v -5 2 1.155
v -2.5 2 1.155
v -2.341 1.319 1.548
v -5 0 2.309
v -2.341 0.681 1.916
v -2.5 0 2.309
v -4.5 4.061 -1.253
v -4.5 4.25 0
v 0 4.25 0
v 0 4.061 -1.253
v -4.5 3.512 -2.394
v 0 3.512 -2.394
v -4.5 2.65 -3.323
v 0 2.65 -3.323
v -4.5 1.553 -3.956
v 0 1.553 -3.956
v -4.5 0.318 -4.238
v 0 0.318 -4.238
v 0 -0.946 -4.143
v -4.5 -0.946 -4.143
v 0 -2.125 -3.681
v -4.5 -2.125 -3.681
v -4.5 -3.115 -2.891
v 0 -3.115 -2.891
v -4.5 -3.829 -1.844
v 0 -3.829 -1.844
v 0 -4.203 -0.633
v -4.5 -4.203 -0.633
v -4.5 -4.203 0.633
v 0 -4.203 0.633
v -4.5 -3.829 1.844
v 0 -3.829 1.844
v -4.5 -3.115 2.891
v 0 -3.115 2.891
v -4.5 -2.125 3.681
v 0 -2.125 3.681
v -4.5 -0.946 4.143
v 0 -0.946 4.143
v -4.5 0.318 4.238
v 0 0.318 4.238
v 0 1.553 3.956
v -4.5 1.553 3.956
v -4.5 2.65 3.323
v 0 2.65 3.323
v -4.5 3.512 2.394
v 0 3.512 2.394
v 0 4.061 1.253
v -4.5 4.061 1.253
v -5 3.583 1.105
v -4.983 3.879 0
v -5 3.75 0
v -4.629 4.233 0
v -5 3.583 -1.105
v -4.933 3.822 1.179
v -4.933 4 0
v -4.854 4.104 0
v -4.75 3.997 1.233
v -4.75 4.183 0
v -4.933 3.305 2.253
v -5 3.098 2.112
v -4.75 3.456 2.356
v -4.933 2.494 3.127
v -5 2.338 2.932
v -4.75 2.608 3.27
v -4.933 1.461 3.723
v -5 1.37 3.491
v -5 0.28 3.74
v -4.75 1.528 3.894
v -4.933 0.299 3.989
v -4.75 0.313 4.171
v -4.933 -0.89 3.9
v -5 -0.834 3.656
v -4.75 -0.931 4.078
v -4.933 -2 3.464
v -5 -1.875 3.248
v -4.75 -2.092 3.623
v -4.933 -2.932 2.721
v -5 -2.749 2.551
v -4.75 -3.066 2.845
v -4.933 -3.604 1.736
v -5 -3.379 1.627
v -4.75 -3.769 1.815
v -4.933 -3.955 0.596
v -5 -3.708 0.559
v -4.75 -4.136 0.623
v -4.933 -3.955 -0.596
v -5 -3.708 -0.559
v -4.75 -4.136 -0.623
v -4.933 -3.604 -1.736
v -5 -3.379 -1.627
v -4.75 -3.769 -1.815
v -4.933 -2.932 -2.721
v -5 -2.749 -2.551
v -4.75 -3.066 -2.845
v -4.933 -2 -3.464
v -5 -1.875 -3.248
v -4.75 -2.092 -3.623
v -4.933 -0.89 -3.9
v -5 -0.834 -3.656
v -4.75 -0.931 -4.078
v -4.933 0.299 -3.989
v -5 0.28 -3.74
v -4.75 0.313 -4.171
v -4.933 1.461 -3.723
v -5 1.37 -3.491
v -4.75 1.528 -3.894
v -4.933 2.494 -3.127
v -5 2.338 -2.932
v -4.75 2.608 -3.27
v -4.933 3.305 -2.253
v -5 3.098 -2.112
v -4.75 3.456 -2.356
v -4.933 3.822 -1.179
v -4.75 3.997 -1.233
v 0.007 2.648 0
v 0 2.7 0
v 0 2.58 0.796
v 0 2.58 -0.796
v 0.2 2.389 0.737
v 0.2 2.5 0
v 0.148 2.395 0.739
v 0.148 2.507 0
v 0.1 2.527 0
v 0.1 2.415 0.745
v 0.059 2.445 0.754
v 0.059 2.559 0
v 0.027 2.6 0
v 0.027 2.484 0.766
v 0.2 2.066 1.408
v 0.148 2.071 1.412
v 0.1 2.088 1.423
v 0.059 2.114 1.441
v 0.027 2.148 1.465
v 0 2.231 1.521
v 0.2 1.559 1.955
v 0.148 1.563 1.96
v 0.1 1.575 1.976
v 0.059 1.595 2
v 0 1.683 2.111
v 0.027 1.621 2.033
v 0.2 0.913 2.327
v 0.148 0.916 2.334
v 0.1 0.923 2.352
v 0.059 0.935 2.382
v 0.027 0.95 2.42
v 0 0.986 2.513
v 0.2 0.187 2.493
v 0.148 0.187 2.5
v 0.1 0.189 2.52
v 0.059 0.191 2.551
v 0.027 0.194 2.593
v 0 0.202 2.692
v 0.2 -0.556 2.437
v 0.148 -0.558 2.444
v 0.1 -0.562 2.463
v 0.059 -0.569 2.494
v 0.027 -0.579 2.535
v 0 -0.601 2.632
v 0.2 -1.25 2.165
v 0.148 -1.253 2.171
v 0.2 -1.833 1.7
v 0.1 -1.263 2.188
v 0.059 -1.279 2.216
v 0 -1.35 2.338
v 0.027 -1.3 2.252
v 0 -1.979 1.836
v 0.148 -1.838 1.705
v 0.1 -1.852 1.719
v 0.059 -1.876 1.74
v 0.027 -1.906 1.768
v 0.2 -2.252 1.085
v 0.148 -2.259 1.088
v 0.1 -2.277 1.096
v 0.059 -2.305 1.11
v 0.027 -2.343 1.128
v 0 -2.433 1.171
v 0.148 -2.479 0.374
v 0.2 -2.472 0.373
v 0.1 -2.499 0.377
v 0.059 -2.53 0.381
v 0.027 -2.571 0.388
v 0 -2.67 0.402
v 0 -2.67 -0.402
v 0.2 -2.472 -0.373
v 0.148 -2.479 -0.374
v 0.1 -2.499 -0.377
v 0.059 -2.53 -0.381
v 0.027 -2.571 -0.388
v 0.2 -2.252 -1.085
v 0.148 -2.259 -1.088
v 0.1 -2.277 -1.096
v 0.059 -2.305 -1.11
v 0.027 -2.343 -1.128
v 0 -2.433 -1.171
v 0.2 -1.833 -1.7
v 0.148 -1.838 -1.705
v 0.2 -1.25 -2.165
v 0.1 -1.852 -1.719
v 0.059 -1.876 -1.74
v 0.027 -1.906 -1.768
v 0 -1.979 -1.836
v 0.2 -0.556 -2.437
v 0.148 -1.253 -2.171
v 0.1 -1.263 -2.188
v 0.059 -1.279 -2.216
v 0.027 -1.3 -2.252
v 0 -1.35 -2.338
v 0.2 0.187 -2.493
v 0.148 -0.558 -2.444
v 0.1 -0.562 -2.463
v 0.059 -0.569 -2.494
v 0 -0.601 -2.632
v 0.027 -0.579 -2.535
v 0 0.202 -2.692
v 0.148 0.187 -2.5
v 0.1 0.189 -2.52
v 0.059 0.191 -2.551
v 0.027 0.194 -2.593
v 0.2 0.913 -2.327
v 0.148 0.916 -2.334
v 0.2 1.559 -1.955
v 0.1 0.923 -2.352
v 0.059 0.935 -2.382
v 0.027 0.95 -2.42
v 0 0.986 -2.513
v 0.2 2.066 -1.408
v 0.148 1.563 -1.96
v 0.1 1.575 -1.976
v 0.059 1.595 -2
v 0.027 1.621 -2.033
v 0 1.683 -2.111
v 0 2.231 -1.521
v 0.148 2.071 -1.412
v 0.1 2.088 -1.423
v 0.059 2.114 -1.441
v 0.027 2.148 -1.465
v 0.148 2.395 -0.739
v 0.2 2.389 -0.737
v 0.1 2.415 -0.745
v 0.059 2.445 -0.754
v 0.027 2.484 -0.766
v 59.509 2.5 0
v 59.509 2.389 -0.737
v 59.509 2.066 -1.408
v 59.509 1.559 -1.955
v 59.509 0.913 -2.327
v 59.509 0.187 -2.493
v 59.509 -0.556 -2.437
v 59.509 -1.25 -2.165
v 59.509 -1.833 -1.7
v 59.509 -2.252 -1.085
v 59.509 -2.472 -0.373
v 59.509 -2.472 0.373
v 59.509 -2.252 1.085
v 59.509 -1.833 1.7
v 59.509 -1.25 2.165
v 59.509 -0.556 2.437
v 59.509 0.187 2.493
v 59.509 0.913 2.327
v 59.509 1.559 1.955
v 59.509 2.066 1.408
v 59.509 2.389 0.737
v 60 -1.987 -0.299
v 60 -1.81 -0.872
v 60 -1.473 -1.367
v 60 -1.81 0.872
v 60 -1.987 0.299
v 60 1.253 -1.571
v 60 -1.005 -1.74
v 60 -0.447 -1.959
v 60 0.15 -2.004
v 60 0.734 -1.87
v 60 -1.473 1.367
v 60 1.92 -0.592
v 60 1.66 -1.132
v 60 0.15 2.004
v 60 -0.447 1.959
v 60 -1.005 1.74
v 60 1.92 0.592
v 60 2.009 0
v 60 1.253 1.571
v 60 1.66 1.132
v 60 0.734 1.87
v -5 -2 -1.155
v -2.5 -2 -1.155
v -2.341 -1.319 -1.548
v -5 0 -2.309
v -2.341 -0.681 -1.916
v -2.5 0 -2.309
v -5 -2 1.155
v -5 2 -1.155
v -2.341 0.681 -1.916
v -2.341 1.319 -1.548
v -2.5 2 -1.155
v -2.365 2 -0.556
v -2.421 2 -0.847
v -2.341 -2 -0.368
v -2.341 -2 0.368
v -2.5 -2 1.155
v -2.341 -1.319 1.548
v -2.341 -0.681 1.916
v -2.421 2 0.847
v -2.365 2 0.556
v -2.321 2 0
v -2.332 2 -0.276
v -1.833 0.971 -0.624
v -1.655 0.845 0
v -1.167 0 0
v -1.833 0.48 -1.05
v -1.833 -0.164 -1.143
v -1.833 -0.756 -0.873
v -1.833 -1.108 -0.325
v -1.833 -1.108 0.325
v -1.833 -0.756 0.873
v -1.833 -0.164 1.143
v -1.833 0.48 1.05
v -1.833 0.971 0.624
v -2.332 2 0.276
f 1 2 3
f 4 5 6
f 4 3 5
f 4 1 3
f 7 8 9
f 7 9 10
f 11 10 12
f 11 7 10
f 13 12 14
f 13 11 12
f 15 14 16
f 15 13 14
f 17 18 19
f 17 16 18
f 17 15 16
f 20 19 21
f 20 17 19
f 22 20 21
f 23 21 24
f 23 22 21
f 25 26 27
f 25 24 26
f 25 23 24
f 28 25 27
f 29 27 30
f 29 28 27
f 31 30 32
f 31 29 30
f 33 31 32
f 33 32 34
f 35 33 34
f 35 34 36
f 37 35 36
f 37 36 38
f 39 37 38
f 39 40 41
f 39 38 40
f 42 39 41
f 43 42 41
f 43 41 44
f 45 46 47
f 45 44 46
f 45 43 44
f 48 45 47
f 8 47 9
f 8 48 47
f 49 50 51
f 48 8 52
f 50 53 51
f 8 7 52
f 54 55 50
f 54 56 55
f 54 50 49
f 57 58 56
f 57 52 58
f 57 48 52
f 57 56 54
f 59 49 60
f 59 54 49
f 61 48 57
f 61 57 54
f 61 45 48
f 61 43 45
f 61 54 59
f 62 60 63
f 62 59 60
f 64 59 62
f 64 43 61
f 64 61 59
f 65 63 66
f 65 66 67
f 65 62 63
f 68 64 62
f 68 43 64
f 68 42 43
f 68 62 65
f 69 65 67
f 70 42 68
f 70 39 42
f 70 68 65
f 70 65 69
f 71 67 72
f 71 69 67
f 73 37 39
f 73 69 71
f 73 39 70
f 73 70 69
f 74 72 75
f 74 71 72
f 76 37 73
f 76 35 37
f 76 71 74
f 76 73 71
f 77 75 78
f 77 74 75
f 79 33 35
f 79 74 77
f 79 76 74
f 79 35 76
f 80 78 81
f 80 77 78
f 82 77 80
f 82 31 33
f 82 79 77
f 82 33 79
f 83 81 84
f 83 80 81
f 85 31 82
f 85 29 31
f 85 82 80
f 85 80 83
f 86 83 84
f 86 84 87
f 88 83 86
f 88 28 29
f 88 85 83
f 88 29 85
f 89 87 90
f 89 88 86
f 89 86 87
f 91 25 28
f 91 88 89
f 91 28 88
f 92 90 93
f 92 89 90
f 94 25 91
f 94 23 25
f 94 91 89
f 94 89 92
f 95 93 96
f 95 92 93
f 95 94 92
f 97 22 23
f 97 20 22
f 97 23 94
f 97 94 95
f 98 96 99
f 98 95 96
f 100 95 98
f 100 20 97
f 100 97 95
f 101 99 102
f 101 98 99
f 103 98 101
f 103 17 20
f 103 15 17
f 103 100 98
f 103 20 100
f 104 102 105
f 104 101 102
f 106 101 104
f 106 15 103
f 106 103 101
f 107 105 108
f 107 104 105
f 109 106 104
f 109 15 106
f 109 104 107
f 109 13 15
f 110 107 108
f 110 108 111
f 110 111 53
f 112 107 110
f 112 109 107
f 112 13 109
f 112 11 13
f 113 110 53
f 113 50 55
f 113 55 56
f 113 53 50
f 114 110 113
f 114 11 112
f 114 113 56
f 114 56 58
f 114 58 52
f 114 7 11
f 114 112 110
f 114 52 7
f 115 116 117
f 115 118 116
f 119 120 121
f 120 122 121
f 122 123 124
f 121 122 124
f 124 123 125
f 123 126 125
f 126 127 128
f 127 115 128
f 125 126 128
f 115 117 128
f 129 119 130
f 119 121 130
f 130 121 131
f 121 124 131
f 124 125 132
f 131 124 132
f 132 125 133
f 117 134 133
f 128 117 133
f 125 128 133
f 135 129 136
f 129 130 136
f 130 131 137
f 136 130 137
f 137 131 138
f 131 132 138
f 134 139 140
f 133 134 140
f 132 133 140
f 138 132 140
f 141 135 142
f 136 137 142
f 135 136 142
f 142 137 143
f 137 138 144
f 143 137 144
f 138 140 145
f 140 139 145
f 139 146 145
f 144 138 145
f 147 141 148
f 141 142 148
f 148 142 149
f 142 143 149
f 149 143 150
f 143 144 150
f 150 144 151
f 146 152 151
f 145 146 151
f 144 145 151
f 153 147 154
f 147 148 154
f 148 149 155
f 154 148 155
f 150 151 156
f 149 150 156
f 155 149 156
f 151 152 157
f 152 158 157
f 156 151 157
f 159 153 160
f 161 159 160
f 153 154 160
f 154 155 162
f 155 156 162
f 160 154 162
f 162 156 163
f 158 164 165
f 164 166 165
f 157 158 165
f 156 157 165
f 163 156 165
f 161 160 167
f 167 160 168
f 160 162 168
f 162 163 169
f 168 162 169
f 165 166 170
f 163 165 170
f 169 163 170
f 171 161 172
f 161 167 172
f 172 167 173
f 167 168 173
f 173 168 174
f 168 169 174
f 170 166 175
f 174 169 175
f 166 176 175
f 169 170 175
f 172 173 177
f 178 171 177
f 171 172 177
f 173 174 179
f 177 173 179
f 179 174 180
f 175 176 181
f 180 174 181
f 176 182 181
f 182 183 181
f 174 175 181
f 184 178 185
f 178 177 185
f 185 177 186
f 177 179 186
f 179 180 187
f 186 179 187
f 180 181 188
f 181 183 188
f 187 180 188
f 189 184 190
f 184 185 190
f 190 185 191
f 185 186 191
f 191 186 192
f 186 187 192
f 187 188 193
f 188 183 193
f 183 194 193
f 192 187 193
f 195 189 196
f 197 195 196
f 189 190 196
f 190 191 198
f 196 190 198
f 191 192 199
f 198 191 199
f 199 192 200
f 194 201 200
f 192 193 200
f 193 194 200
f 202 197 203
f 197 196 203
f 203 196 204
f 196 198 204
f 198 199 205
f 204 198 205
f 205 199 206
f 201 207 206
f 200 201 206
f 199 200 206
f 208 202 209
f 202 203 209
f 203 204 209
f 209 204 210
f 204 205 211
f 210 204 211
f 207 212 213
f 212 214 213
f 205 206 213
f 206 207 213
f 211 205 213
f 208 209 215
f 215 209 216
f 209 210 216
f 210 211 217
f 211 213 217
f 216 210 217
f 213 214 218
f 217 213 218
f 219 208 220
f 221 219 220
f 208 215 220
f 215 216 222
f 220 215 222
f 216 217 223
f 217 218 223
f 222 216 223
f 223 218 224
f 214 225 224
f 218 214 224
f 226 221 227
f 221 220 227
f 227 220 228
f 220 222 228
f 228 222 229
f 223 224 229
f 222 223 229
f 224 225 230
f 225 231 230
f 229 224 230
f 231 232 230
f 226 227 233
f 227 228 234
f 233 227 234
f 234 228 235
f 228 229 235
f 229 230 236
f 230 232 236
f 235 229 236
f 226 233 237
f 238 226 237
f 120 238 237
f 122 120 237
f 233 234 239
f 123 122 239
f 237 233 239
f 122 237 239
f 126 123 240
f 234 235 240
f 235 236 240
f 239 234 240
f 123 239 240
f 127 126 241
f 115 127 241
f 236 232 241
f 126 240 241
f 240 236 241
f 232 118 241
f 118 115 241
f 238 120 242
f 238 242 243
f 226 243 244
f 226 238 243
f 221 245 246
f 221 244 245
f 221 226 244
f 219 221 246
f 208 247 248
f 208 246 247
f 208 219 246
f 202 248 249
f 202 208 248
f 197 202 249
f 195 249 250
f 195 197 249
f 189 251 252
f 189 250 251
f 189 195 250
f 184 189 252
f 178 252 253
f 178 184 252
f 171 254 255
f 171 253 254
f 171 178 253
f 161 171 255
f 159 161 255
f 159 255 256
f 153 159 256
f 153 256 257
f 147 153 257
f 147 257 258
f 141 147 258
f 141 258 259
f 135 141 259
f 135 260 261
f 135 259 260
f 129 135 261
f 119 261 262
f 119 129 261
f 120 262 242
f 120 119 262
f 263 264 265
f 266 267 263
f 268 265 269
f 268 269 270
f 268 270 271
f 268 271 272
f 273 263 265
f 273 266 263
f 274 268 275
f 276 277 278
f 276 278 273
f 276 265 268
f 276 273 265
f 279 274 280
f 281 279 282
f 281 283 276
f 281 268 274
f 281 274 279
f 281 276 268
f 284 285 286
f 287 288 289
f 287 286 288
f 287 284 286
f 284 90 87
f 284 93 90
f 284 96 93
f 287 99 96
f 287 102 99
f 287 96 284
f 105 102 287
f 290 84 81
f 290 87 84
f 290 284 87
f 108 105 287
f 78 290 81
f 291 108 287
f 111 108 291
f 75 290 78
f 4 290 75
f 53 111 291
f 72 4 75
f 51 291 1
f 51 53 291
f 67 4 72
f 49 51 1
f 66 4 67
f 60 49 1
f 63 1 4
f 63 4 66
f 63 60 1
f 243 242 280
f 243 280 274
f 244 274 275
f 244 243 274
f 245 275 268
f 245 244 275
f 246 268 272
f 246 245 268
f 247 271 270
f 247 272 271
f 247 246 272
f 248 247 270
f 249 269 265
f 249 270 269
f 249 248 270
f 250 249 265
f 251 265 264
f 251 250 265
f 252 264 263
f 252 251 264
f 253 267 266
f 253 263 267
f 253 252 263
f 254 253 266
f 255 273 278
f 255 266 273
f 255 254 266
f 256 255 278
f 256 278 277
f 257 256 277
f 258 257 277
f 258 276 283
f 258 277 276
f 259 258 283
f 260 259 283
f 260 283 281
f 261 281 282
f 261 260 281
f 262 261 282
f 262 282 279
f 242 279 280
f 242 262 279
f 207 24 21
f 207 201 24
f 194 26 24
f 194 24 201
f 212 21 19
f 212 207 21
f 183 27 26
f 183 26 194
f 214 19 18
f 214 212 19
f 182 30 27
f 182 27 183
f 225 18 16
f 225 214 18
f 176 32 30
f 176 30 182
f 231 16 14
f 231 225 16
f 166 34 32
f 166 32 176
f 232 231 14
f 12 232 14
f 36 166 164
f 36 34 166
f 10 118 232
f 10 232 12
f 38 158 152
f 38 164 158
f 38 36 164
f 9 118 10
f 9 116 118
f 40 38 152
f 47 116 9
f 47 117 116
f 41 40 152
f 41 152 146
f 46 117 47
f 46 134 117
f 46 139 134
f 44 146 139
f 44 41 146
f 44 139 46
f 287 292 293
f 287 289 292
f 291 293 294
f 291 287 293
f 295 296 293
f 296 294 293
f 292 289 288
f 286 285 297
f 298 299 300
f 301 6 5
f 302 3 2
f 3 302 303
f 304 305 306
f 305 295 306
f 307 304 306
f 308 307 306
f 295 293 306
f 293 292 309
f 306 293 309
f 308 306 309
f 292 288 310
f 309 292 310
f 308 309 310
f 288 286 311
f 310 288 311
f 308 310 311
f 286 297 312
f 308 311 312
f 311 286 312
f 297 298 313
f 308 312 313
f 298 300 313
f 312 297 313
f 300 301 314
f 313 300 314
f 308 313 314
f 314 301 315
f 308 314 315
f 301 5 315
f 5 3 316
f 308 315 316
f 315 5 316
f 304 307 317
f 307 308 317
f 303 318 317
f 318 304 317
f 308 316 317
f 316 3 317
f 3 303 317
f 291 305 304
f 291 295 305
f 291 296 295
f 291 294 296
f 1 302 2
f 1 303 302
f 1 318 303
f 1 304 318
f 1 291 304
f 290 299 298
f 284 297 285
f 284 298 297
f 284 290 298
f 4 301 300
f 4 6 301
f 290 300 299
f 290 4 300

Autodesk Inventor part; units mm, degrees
ref_plane "YZ Plane" through (0, 0, 0) normal (1, 0, 0) x (0, 1, 0)
ref_plane "XZ Plane" through (0, 0, 0) normal (0, 1, 0) x (-1, 0, 0)
sketch "Sketch1" plane through (0, 0, 0) normal (0, 0, 1) x (1, 0, 0)
  line L0 (-1.1667, 0) -> (60, 0)
  line L1 (60, 0) -> (60, 2.5)
  line L2 (60, 2.5) -> (38, 2.5)
  line L3 (38, 2.5) -> (37.5091, 2.5)
  line L4 (37.5091, 2.5) -> (0, 2.5)
  line L5 (0, 2.5) -> (0, 4.25)
  line L6 (0, 4.25) -> (-5, 4.25)
  line L7 (-5, 4.25) -> (-5, 2.3094)
  line L8 (-5, 2.3094) -> (-2.5, 2.3094)
  line L9 (-2.5, 2.3094) -> (-1.1667, 0)
  line L10 (-22, 0) -> (97, 0) projected
  line L11 (0, -0.85) -> (0, 5.1) projected
  line L12 (38, 2.5) -> (0, 2.5) construction
  dimension "d1" = 22
  dimension "d2" = 0.4909
  dimension "d3" = 5
  dimension "d4" = 2.5
  dimension "d5" = 60
  dimension "d6" = 5
  dimension "d7" = 5
  dimension "d8" = 4.6188
  dimension "d9" = 8.5
  dimension "d26" = 60
revolve "Body" add sketch "Sketch1" angle 360 about axis through (-1.1667, 0, 0) along (1, 0, 0)
sketch "Sketch2" plane through (-5, 0, 0) normal (-1, 0, 0) x (0, 0, 1)
  circle A0 centre (0, 0) radius 2.3094 projected
  line L0 (0, -5.95) -> (0, 5.95) projected
  line L1 (-5.95, 0) -> (5.95, 0) projected
  line L2 (2.3094, 0) -> (1.1547, -2)
  line L3 (1.1547, -2) -> (-1.1547, -2)
  line L4 (-1.1547, -2) -> (-2.3094, 0)
  line L5 (-2.3094, 0) -> (-1.1547, 2)
  line L6 (-1.1547, 2) -> (1.1547, 2)
  line L7 (1.1547, 2) -> (2.3094, 0)
extrude "Slot" add sketch "Sketch2" against normal up to next contours L7 A0 | A0 L2 | L6 L0 A0 | A0 L0 L3 | L0 L6 A0 | A0 L3 L0 | L4 A0 | A0 L5
fillet "Fillet1" radius 0.5 1 edges at (-5, -4.25, 0)
thread "Thread" size "M5x0.8" class "6g" standard "ISO Metric profile" length 22
chamfer "Chamfer1" distance 0.4908 distance2 0.4908 1 edges at (60, -2.5, 0) measured on face at (60, -0.6238, -0.819)
ref_plane "Work Plane1" through (29, 0, 0) normal (0, -1, 0) x (1, 0, 0)
fillet "Fillet2" radius 0.2 1 edges at (0, -2.5, 0)
equation "\"d30\" = R"
equation "\"d17\" = RR"
equation "\"d13\" = GEL"
equation "\"d15\" = -0.5 * SPD + 0.5 * GD"
equation "\"d16\" = GUL"
equation "\"d1\" = GEL"
equation "\"d3\" = KOH"
equation "\"d4\" = INTI"
equation "\"d6\" = GD"
equation "\"d7\" = BDM"
equation "\"d8\" = 1.1547 * SW"
equation "\"d9\" = KOD"
equation "\"d26\" = NLG"
equation "\"GD\" = NND"
equation "\"NLG\" = 60"
equation "\"GEL\" = 22"
equation "\"KOD\" = 8.5"
equation "\"KOH\" = 5"
equation "\"INTI\" = 2.5"
equation "\"GAL\" = 0.61345 * PTC"
equation "\"GUL\" = 0.61345 * PTC"
equation "\"BDM\" = NND"
equation "\"SW\" = 4"
equation "\"RR\" = 0.5"
equation "\"SPD\" = NND - 1.2269 * PTC"
equation "\"R\" = 0.2"
equation "\"TOA\" = 30deg"
equation "\"GD1\" = THREADDIA - 1.2269 * PTC"
equation "\"THREADDIA\" = 5"
equation "\"FAWI\" = 45deg"
equation "\"ANG\" = 120deg"
equation "\"PTC\" = 0.8"
equation "\"NND\" = 5"
equation "\"E0\" = 1.155 * SW"
properties material "Steel, Mild"
